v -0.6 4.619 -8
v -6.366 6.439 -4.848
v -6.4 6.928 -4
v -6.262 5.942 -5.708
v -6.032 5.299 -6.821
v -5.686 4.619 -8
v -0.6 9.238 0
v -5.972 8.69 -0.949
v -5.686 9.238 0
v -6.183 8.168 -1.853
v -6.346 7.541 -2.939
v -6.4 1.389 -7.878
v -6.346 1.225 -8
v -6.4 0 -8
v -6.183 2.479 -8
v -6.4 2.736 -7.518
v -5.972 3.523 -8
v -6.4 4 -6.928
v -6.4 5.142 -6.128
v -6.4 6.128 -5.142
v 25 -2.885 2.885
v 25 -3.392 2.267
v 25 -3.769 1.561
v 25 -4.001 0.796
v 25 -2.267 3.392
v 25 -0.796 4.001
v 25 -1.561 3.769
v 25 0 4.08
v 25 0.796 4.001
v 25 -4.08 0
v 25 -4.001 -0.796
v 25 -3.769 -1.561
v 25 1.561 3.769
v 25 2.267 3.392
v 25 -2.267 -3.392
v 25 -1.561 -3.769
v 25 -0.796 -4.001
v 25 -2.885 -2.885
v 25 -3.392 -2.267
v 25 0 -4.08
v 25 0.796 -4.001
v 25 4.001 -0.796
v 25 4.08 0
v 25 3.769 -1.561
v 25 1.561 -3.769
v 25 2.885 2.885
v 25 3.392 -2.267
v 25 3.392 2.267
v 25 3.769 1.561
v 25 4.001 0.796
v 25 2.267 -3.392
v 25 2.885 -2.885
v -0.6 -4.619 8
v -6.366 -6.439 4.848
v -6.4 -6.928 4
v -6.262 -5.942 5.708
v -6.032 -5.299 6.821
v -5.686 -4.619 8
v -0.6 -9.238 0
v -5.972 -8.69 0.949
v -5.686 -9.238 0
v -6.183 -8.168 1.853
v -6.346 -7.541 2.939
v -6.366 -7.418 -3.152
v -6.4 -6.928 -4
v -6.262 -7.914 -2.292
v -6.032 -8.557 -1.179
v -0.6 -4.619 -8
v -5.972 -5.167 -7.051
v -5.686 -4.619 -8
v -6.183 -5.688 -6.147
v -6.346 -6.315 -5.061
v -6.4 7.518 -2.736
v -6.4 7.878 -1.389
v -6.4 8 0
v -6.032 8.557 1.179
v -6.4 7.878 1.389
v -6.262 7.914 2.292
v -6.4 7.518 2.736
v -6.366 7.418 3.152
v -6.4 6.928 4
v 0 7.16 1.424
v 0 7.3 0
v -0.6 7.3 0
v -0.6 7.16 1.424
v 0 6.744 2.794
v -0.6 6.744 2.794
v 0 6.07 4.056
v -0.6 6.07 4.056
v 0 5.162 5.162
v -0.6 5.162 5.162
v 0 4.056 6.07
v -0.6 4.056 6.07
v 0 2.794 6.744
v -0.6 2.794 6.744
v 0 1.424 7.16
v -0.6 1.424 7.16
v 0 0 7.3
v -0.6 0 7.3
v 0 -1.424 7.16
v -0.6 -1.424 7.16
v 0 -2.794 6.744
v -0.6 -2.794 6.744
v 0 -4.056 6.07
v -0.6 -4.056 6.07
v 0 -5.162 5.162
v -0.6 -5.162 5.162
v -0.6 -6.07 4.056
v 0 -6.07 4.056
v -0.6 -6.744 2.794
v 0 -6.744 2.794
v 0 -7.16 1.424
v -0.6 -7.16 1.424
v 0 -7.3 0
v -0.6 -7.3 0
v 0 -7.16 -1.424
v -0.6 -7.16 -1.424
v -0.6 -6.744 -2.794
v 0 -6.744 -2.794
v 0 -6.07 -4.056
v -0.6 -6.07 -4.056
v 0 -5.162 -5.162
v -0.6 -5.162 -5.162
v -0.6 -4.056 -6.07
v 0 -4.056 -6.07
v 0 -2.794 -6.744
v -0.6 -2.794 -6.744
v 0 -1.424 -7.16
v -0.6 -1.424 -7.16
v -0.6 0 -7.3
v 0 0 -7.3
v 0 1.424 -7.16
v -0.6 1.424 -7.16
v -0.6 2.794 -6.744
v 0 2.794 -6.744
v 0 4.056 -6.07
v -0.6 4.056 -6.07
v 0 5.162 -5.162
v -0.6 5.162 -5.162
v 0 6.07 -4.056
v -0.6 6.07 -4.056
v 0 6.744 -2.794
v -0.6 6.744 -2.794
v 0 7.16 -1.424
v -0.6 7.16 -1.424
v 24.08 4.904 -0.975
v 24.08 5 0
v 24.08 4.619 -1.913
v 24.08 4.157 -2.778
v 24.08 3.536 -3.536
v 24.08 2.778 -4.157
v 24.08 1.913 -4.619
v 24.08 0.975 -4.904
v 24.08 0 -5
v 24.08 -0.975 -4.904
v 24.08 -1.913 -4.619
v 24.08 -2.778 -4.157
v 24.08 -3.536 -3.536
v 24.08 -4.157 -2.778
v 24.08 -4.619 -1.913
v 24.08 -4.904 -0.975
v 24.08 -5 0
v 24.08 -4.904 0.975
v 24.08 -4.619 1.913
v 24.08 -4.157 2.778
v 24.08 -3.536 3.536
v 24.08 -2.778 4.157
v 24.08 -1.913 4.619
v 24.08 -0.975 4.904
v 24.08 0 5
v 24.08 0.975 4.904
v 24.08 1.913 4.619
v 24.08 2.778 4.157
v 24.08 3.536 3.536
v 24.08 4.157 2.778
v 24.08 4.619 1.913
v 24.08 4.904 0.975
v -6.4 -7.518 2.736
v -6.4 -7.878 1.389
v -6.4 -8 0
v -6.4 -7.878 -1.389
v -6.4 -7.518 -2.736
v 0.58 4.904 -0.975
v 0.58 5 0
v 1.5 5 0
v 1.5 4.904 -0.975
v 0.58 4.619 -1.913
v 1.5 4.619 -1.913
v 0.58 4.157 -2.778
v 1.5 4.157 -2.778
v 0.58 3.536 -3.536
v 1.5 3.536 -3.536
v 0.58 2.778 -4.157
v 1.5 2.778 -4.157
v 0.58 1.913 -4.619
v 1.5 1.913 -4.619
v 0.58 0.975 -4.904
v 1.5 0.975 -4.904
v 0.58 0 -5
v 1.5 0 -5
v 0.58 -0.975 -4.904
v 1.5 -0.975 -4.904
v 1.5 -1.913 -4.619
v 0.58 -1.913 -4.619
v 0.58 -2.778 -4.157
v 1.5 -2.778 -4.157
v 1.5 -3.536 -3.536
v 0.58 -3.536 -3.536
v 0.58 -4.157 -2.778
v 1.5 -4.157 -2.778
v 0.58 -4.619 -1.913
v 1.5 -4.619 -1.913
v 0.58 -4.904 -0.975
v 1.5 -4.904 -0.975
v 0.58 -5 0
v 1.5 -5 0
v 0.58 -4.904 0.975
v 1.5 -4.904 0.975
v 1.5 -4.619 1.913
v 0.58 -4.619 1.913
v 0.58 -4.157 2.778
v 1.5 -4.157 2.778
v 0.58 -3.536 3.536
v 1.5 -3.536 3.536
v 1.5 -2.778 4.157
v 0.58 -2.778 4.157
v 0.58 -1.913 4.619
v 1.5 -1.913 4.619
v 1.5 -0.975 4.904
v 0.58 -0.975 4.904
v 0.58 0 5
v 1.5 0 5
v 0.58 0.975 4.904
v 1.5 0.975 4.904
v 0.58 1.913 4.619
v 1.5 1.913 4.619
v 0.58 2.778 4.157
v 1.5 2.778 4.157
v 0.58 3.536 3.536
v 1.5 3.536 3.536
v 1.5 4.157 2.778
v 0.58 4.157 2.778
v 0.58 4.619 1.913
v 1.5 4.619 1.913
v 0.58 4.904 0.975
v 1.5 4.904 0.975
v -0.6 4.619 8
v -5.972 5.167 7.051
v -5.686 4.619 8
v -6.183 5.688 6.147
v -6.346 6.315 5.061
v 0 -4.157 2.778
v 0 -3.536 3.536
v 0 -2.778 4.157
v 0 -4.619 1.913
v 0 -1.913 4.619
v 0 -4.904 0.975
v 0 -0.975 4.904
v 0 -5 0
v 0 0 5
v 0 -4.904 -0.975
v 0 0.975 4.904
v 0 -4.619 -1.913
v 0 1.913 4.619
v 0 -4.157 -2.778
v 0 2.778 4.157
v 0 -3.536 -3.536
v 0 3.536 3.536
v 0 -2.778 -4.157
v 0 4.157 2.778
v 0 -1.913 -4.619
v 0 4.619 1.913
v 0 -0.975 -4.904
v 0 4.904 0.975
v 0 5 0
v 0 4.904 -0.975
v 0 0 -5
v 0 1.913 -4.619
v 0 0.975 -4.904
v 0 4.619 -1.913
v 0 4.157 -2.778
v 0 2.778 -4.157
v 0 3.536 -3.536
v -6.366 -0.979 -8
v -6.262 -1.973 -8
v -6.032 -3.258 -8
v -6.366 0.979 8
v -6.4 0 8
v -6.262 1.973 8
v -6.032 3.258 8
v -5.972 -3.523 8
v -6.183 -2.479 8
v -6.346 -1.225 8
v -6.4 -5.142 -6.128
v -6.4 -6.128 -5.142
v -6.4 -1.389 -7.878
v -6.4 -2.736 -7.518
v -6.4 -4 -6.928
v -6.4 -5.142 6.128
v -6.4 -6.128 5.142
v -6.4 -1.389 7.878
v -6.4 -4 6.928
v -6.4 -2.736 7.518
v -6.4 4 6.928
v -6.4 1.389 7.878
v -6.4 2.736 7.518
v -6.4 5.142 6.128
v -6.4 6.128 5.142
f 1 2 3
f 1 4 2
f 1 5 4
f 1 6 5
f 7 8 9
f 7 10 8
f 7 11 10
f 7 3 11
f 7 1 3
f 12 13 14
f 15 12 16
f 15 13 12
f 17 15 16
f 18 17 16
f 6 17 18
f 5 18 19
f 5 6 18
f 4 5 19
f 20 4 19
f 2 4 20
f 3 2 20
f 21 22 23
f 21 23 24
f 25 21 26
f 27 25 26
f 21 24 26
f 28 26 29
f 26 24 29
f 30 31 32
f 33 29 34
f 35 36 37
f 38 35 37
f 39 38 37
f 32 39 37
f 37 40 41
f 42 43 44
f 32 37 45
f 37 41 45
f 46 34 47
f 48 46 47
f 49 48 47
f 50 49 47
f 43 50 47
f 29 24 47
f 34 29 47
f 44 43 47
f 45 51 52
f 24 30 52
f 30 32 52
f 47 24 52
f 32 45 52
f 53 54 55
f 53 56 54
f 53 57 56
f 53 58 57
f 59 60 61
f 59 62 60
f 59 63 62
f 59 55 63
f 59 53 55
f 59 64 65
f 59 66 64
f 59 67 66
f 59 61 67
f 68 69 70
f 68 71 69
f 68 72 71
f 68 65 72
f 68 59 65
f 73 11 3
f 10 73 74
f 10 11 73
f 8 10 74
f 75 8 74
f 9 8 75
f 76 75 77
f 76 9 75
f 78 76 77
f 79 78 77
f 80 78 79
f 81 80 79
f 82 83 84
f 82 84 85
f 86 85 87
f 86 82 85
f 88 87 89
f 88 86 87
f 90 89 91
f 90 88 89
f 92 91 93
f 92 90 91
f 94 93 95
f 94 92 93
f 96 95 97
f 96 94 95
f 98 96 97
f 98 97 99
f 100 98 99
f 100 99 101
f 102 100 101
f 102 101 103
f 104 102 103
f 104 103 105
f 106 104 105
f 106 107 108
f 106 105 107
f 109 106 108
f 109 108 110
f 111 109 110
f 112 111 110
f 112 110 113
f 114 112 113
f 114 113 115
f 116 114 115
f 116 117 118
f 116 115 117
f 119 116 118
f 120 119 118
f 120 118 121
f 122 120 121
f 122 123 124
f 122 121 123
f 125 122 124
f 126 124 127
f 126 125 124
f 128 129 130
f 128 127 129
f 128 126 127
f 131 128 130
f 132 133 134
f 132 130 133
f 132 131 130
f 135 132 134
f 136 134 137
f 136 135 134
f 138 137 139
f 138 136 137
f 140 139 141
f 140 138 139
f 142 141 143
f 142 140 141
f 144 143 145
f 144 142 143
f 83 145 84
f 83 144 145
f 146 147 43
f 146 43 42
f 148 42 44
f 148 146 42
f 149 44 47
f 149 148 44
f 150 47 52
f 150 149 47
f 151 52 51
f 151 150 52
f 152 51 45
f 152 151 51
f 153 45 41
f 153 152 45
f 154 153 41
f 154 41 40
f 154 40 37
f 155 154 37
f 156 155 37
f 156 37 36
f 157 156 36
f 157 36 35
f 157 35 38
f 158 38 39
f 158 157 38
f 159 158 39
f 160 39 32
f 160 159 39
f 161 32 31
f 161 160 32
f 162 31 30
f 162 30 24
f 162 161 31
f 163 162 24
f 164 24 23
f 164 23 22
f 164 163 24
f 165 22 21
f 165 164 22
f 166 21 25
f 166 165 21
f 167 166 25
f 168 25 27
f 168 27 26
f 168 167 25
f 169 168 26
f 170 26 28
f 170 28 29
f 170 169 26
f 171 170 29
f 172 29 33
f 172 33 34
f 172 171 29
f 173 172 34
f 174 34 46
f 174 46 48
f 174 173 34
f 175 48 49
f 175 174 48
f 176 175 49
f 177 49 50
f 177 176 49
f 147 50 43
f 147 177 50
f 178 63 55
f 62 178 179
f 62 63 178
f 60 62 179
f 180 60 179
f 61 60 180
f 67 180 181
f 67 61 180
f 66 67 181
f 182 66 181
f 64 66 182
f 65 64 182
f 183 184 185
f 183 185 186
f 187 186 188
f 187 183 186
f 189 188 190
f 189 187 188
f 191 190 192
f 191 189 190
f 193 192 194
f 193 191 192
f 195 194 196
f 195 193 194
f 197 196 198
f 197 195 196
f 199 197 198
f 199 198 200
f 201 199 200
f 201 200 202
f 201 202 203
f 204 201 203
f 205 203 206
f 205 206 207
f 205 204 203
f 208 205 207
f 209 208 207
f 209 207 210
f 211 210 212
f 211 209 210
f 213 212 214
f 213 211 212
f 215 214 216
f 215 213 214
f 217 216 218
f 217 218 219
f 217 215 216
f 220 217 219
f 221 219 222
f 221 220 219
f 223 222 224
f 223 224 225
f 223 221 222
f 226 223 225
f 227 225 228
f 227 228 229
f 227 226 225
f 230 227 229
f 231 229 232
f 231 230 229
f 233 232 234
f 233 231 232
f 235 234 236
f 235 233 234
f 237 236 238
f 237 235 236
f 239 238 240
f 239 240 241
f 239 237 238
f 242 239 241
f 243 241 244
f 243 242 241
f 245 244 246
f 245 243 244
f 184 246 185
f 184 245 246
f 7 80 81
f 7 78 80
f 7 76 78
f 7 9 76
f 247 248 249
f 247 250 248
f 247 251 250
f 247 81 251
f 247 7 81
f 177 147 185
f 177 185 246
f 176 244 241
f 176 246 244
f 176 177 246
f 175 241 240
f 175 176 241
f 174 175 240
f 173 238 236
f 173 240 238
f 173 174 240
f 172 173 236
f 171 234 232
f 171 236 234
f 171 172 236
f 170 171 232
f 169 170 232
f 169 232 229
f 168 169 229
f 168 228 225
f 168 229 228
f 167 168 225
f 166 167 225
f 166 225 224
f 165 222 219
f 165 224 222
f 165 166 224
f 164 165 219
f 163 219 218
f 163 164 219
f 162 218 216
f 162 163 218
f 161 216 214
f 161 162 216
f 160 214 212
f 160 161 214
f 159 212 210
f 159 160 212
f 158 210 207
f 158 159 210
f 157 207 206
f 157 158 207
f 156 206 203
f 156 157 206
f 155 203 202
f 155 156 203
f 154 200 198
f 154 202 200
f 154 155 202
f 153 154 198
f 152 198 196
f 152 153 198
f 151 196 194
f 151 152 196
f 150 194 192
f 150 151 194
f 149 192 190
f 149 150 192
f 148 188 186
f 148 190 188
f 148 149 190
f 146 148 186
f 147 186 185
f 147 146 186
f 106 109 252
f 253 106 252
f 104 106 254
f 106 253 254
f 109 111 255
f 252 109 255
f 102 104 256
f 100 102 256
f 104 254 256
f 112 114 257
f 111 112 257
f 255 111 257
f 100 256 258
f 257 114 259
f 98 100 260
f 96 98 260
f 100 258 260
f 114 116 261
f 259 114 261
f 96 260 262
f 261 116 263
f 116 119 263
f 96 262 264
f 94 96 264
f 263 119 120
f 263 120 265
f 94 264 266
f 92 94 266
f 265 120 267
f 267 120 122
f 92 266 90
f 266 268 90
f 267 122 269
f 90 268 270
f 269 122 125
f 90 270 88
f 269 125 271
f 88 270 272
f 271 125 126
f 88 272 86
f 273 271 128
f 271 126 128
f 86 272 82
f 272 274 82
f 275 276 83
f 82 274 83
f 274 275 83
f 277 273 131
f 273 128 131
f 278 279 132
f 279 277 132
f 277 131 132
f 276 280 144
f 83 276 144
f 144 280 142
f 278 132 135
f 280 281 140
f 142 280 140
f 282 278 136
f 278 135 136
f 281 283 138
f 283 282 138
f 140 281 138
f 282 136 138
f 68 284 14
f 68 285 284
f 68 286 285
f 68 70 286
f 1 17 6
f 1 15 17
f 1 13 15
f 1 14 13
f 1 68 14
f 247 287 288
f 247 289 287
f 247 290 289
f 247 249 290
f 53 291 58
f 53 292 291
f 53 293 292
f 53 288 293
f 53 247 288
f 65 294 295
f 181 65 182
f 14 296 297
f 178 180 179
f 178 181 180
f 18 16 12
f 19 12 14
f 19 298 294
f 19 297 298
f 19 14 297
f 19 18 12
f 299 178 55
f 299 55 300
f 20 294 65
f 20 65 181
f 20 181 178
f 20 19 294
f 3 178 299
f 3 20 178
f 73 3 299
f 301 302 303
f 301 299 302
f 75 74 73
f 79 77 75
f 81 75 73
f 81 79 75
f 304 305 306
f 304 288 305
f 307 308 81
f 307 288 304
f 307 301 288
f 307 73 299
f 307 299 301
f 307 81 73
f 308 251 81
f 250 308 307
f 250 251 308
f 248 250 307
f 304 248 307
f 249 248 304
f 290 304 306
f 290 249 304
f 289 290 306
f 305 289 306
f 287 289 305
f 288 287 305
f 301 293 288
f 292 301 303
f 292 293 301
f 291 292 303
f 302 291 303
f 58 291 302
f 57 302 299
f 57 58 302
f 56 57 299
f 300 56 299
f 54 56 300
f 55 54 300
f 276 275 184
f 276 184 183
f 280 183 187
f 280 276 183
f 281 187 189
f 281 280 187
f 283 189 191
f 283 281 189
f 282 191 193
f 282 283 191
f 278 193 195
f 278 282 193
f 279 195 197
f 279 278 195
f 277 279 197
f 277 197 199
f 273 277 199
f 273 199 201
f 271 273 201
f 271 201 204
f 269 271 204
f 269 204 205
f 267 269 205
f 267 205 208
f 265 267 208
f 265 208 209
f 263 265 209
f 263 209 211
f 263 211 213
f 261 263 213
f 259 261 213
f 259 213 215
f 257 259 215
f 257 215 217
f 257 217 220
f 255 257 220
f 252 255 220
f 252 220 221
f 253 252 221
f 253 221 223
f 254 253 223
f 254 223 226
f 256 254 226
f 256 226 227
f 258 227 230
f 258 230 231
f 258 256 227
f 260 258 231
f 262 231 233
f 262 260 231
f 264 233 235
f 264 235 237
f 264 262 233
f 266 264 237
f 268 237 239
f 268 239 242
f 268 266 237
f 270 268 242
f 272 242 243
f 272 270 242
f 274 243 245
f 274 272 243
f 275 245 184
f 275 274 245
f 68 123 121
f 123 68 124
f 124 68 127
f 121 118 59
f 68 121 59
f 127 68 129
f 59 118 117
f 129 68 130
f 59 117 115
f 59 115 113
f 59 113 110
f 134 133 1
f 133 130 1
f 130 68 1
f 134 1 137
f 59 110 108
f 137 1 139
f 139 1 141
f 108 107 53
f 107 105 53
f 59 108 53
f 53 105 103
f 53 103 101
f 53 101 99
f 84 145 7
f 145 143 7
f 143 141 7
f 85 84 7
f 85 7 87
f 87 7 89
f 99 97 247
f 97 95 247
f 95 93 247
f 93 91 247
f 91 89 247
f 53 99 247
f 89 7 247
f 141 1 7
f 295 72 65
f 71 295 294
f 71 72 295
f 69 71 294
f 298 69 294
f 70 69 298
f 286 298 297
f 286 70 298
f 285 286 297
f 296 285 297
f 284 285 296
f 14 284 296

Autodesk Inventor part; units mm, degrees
ref_plane "YZ Plane" through (0, 0, 0) normal (1, 0, 0) x (0, 1, 0)
ref_plane "XZ Plane" through (0, 0, 0) normal (0, 1, 0) x (-1, 0, 0)
sketch "草图1" plane through (0, 0, 0) normal (0, 0, 1) x (1, 0, 0)
  line L0 (0, 7.3) -> (0, 5)
  line L1 (1.5, 5) -> (25, 5)
  line L2 (25, 5) -> (25, 0)
  line L3 (25, 0) -> (-0.6001, 0)
  line L4 (-5.7201, 0) -> (30.12, 0) projected
  line L5 (-0.6001, 0) -> (-0.6001, 7.3)
  line L6 (-0.6001, 7.3) -> (0, 7.3)
  line L7 (1.5, 5) -> (0.5797, 5)
  line L8 (0.5797, 5) -> (0, 5)
  line L9 (0, -1.46) -> (0, 8.76) projected
  dimension "d0" = 25
  dimension "d1" = 23.5
  dimension "d2" = 10
  dimension "d9" = 0.6001
  dimension "d10" = 14.6
  dimension "d13" = 0.9203
  dimension "d14" = 10
revolve "轴承体" add sketch "草图1" angle 360 about axis through (25, 0, 0) along (-1, 0, 0)
sketch "草图2" plane through (-0.6001, 0, 0) normal (-1, 0, 0) x (0, 0, 1)
  line L0 (0, 9.2376) -> (8, 4.6188)
  line L1 (8, 4.6188) -> (8, -4.6188)
  line L2 (8, -4.6188) -> (0, -9.2376)
  line L3 (0, -9.2376) -> (-8, -4.6188)
  line L4 (-8, -4.6188) -> (-8, 4.6188)
  line L5 (-8, 4.6188) -> (0, 9.2376)
  point P0 (0, 0)
  point P1 (0, 0)
  dimension "d11" = 16
extrude "头" add sketch "草图2" along normal blind 5.8
sketch "草图4" plane through (0, 0, 0) normal (0, 0, 1) x (1, 0, 0)
  line L0 (-6.4001, 8) -> (-6.4001, 9.2376)
  line L1 (-6.4001, 9.2376) -> (-5.6856, 9.2376)
  line L2 (-5.6856, 9.2376) -> (-6.4001, 8)
  line L3 (-7.5601, 0) -> (0.5599, 0) projected
  line L4 (-0.6001, 9.2376) -> (-6.4001, 9.2376) projected
  line L5 (-6.4001, 4.6188) -> (-6.4001, 9.2376) projected
  dimension "d5" = 30
  dimension "d19" = 16
revolve "倒角1" cut sketch "草图4" angle 360 about axis through (-10, 0, 0) along (1, 0, 0)
thread "螺纹" size "M10x1.5" designation "M10" class "6g" standard "GB Metric profile" length 23.5
chamfer "倒角2" distance 0.9202 distance2 0.9203 1 edges at (25, -5, 0) measured on face at (25, 1.974, 0.2121)
ref_plane "Work Plane1" through (1.525, 0, 0) normal (0, 0, 1) x (1, 0, 0)
equation "\"d11\" = SW"
equation "\"d3\" = KOH - SD"
equation "\"d15\" = GEL"
equation "\"d6\" = -0.5 * SPD + 0.5 * GD"
equation "\"d0\" = NLG"
equation "\"d1\" = GEL"
equation "\"d2\" = GD"
equation "\"d10\" = SD2"
equation "\"d14\" = BDM"
equation "\"d5\" = ANG1"
equation "\"d19\" = SW0"
equation "\"NLG\" = 25"
equation "\"GD\" = NND"
equation "\"BDM\" = NND"
equation "\"KOH\" = 6.4"
equation "\"GEL\" = 23.5"
equation "\"SW\" = 16"
equation "\"SW0\" = SW"
equation "\"SPD\" = NND - 1.2269 * PTC"
equation "\"SD2\" = SDH"
equation "\"SD\" = WFT"
equation "\"ANG1\" = 30deg"
equation "\"GAL\" = 0.61345 * PTC"
equation "\"GUL\" = 0.61345 * PTC"
equation "\"RR\" = 0.4"
equation "\"WFT\" = 0.6"
equation "\"GD1\" = THREADDIA - 1.2269 * PTC"
equation "\"SDH\" = 14.6"
equation "\"TOA\" = 30deg"
equation "\"FAWI\" = 45deg"
equation "\"PTC\" = 1.5"
equation "\"E0\" = 1.155 * SW"
equation "\"NND\" = 10"
equation "\"THREADDIA\" = 10"
properties part number "螺栓 GB/T 5783 M10 x 25" material "钢，软"
